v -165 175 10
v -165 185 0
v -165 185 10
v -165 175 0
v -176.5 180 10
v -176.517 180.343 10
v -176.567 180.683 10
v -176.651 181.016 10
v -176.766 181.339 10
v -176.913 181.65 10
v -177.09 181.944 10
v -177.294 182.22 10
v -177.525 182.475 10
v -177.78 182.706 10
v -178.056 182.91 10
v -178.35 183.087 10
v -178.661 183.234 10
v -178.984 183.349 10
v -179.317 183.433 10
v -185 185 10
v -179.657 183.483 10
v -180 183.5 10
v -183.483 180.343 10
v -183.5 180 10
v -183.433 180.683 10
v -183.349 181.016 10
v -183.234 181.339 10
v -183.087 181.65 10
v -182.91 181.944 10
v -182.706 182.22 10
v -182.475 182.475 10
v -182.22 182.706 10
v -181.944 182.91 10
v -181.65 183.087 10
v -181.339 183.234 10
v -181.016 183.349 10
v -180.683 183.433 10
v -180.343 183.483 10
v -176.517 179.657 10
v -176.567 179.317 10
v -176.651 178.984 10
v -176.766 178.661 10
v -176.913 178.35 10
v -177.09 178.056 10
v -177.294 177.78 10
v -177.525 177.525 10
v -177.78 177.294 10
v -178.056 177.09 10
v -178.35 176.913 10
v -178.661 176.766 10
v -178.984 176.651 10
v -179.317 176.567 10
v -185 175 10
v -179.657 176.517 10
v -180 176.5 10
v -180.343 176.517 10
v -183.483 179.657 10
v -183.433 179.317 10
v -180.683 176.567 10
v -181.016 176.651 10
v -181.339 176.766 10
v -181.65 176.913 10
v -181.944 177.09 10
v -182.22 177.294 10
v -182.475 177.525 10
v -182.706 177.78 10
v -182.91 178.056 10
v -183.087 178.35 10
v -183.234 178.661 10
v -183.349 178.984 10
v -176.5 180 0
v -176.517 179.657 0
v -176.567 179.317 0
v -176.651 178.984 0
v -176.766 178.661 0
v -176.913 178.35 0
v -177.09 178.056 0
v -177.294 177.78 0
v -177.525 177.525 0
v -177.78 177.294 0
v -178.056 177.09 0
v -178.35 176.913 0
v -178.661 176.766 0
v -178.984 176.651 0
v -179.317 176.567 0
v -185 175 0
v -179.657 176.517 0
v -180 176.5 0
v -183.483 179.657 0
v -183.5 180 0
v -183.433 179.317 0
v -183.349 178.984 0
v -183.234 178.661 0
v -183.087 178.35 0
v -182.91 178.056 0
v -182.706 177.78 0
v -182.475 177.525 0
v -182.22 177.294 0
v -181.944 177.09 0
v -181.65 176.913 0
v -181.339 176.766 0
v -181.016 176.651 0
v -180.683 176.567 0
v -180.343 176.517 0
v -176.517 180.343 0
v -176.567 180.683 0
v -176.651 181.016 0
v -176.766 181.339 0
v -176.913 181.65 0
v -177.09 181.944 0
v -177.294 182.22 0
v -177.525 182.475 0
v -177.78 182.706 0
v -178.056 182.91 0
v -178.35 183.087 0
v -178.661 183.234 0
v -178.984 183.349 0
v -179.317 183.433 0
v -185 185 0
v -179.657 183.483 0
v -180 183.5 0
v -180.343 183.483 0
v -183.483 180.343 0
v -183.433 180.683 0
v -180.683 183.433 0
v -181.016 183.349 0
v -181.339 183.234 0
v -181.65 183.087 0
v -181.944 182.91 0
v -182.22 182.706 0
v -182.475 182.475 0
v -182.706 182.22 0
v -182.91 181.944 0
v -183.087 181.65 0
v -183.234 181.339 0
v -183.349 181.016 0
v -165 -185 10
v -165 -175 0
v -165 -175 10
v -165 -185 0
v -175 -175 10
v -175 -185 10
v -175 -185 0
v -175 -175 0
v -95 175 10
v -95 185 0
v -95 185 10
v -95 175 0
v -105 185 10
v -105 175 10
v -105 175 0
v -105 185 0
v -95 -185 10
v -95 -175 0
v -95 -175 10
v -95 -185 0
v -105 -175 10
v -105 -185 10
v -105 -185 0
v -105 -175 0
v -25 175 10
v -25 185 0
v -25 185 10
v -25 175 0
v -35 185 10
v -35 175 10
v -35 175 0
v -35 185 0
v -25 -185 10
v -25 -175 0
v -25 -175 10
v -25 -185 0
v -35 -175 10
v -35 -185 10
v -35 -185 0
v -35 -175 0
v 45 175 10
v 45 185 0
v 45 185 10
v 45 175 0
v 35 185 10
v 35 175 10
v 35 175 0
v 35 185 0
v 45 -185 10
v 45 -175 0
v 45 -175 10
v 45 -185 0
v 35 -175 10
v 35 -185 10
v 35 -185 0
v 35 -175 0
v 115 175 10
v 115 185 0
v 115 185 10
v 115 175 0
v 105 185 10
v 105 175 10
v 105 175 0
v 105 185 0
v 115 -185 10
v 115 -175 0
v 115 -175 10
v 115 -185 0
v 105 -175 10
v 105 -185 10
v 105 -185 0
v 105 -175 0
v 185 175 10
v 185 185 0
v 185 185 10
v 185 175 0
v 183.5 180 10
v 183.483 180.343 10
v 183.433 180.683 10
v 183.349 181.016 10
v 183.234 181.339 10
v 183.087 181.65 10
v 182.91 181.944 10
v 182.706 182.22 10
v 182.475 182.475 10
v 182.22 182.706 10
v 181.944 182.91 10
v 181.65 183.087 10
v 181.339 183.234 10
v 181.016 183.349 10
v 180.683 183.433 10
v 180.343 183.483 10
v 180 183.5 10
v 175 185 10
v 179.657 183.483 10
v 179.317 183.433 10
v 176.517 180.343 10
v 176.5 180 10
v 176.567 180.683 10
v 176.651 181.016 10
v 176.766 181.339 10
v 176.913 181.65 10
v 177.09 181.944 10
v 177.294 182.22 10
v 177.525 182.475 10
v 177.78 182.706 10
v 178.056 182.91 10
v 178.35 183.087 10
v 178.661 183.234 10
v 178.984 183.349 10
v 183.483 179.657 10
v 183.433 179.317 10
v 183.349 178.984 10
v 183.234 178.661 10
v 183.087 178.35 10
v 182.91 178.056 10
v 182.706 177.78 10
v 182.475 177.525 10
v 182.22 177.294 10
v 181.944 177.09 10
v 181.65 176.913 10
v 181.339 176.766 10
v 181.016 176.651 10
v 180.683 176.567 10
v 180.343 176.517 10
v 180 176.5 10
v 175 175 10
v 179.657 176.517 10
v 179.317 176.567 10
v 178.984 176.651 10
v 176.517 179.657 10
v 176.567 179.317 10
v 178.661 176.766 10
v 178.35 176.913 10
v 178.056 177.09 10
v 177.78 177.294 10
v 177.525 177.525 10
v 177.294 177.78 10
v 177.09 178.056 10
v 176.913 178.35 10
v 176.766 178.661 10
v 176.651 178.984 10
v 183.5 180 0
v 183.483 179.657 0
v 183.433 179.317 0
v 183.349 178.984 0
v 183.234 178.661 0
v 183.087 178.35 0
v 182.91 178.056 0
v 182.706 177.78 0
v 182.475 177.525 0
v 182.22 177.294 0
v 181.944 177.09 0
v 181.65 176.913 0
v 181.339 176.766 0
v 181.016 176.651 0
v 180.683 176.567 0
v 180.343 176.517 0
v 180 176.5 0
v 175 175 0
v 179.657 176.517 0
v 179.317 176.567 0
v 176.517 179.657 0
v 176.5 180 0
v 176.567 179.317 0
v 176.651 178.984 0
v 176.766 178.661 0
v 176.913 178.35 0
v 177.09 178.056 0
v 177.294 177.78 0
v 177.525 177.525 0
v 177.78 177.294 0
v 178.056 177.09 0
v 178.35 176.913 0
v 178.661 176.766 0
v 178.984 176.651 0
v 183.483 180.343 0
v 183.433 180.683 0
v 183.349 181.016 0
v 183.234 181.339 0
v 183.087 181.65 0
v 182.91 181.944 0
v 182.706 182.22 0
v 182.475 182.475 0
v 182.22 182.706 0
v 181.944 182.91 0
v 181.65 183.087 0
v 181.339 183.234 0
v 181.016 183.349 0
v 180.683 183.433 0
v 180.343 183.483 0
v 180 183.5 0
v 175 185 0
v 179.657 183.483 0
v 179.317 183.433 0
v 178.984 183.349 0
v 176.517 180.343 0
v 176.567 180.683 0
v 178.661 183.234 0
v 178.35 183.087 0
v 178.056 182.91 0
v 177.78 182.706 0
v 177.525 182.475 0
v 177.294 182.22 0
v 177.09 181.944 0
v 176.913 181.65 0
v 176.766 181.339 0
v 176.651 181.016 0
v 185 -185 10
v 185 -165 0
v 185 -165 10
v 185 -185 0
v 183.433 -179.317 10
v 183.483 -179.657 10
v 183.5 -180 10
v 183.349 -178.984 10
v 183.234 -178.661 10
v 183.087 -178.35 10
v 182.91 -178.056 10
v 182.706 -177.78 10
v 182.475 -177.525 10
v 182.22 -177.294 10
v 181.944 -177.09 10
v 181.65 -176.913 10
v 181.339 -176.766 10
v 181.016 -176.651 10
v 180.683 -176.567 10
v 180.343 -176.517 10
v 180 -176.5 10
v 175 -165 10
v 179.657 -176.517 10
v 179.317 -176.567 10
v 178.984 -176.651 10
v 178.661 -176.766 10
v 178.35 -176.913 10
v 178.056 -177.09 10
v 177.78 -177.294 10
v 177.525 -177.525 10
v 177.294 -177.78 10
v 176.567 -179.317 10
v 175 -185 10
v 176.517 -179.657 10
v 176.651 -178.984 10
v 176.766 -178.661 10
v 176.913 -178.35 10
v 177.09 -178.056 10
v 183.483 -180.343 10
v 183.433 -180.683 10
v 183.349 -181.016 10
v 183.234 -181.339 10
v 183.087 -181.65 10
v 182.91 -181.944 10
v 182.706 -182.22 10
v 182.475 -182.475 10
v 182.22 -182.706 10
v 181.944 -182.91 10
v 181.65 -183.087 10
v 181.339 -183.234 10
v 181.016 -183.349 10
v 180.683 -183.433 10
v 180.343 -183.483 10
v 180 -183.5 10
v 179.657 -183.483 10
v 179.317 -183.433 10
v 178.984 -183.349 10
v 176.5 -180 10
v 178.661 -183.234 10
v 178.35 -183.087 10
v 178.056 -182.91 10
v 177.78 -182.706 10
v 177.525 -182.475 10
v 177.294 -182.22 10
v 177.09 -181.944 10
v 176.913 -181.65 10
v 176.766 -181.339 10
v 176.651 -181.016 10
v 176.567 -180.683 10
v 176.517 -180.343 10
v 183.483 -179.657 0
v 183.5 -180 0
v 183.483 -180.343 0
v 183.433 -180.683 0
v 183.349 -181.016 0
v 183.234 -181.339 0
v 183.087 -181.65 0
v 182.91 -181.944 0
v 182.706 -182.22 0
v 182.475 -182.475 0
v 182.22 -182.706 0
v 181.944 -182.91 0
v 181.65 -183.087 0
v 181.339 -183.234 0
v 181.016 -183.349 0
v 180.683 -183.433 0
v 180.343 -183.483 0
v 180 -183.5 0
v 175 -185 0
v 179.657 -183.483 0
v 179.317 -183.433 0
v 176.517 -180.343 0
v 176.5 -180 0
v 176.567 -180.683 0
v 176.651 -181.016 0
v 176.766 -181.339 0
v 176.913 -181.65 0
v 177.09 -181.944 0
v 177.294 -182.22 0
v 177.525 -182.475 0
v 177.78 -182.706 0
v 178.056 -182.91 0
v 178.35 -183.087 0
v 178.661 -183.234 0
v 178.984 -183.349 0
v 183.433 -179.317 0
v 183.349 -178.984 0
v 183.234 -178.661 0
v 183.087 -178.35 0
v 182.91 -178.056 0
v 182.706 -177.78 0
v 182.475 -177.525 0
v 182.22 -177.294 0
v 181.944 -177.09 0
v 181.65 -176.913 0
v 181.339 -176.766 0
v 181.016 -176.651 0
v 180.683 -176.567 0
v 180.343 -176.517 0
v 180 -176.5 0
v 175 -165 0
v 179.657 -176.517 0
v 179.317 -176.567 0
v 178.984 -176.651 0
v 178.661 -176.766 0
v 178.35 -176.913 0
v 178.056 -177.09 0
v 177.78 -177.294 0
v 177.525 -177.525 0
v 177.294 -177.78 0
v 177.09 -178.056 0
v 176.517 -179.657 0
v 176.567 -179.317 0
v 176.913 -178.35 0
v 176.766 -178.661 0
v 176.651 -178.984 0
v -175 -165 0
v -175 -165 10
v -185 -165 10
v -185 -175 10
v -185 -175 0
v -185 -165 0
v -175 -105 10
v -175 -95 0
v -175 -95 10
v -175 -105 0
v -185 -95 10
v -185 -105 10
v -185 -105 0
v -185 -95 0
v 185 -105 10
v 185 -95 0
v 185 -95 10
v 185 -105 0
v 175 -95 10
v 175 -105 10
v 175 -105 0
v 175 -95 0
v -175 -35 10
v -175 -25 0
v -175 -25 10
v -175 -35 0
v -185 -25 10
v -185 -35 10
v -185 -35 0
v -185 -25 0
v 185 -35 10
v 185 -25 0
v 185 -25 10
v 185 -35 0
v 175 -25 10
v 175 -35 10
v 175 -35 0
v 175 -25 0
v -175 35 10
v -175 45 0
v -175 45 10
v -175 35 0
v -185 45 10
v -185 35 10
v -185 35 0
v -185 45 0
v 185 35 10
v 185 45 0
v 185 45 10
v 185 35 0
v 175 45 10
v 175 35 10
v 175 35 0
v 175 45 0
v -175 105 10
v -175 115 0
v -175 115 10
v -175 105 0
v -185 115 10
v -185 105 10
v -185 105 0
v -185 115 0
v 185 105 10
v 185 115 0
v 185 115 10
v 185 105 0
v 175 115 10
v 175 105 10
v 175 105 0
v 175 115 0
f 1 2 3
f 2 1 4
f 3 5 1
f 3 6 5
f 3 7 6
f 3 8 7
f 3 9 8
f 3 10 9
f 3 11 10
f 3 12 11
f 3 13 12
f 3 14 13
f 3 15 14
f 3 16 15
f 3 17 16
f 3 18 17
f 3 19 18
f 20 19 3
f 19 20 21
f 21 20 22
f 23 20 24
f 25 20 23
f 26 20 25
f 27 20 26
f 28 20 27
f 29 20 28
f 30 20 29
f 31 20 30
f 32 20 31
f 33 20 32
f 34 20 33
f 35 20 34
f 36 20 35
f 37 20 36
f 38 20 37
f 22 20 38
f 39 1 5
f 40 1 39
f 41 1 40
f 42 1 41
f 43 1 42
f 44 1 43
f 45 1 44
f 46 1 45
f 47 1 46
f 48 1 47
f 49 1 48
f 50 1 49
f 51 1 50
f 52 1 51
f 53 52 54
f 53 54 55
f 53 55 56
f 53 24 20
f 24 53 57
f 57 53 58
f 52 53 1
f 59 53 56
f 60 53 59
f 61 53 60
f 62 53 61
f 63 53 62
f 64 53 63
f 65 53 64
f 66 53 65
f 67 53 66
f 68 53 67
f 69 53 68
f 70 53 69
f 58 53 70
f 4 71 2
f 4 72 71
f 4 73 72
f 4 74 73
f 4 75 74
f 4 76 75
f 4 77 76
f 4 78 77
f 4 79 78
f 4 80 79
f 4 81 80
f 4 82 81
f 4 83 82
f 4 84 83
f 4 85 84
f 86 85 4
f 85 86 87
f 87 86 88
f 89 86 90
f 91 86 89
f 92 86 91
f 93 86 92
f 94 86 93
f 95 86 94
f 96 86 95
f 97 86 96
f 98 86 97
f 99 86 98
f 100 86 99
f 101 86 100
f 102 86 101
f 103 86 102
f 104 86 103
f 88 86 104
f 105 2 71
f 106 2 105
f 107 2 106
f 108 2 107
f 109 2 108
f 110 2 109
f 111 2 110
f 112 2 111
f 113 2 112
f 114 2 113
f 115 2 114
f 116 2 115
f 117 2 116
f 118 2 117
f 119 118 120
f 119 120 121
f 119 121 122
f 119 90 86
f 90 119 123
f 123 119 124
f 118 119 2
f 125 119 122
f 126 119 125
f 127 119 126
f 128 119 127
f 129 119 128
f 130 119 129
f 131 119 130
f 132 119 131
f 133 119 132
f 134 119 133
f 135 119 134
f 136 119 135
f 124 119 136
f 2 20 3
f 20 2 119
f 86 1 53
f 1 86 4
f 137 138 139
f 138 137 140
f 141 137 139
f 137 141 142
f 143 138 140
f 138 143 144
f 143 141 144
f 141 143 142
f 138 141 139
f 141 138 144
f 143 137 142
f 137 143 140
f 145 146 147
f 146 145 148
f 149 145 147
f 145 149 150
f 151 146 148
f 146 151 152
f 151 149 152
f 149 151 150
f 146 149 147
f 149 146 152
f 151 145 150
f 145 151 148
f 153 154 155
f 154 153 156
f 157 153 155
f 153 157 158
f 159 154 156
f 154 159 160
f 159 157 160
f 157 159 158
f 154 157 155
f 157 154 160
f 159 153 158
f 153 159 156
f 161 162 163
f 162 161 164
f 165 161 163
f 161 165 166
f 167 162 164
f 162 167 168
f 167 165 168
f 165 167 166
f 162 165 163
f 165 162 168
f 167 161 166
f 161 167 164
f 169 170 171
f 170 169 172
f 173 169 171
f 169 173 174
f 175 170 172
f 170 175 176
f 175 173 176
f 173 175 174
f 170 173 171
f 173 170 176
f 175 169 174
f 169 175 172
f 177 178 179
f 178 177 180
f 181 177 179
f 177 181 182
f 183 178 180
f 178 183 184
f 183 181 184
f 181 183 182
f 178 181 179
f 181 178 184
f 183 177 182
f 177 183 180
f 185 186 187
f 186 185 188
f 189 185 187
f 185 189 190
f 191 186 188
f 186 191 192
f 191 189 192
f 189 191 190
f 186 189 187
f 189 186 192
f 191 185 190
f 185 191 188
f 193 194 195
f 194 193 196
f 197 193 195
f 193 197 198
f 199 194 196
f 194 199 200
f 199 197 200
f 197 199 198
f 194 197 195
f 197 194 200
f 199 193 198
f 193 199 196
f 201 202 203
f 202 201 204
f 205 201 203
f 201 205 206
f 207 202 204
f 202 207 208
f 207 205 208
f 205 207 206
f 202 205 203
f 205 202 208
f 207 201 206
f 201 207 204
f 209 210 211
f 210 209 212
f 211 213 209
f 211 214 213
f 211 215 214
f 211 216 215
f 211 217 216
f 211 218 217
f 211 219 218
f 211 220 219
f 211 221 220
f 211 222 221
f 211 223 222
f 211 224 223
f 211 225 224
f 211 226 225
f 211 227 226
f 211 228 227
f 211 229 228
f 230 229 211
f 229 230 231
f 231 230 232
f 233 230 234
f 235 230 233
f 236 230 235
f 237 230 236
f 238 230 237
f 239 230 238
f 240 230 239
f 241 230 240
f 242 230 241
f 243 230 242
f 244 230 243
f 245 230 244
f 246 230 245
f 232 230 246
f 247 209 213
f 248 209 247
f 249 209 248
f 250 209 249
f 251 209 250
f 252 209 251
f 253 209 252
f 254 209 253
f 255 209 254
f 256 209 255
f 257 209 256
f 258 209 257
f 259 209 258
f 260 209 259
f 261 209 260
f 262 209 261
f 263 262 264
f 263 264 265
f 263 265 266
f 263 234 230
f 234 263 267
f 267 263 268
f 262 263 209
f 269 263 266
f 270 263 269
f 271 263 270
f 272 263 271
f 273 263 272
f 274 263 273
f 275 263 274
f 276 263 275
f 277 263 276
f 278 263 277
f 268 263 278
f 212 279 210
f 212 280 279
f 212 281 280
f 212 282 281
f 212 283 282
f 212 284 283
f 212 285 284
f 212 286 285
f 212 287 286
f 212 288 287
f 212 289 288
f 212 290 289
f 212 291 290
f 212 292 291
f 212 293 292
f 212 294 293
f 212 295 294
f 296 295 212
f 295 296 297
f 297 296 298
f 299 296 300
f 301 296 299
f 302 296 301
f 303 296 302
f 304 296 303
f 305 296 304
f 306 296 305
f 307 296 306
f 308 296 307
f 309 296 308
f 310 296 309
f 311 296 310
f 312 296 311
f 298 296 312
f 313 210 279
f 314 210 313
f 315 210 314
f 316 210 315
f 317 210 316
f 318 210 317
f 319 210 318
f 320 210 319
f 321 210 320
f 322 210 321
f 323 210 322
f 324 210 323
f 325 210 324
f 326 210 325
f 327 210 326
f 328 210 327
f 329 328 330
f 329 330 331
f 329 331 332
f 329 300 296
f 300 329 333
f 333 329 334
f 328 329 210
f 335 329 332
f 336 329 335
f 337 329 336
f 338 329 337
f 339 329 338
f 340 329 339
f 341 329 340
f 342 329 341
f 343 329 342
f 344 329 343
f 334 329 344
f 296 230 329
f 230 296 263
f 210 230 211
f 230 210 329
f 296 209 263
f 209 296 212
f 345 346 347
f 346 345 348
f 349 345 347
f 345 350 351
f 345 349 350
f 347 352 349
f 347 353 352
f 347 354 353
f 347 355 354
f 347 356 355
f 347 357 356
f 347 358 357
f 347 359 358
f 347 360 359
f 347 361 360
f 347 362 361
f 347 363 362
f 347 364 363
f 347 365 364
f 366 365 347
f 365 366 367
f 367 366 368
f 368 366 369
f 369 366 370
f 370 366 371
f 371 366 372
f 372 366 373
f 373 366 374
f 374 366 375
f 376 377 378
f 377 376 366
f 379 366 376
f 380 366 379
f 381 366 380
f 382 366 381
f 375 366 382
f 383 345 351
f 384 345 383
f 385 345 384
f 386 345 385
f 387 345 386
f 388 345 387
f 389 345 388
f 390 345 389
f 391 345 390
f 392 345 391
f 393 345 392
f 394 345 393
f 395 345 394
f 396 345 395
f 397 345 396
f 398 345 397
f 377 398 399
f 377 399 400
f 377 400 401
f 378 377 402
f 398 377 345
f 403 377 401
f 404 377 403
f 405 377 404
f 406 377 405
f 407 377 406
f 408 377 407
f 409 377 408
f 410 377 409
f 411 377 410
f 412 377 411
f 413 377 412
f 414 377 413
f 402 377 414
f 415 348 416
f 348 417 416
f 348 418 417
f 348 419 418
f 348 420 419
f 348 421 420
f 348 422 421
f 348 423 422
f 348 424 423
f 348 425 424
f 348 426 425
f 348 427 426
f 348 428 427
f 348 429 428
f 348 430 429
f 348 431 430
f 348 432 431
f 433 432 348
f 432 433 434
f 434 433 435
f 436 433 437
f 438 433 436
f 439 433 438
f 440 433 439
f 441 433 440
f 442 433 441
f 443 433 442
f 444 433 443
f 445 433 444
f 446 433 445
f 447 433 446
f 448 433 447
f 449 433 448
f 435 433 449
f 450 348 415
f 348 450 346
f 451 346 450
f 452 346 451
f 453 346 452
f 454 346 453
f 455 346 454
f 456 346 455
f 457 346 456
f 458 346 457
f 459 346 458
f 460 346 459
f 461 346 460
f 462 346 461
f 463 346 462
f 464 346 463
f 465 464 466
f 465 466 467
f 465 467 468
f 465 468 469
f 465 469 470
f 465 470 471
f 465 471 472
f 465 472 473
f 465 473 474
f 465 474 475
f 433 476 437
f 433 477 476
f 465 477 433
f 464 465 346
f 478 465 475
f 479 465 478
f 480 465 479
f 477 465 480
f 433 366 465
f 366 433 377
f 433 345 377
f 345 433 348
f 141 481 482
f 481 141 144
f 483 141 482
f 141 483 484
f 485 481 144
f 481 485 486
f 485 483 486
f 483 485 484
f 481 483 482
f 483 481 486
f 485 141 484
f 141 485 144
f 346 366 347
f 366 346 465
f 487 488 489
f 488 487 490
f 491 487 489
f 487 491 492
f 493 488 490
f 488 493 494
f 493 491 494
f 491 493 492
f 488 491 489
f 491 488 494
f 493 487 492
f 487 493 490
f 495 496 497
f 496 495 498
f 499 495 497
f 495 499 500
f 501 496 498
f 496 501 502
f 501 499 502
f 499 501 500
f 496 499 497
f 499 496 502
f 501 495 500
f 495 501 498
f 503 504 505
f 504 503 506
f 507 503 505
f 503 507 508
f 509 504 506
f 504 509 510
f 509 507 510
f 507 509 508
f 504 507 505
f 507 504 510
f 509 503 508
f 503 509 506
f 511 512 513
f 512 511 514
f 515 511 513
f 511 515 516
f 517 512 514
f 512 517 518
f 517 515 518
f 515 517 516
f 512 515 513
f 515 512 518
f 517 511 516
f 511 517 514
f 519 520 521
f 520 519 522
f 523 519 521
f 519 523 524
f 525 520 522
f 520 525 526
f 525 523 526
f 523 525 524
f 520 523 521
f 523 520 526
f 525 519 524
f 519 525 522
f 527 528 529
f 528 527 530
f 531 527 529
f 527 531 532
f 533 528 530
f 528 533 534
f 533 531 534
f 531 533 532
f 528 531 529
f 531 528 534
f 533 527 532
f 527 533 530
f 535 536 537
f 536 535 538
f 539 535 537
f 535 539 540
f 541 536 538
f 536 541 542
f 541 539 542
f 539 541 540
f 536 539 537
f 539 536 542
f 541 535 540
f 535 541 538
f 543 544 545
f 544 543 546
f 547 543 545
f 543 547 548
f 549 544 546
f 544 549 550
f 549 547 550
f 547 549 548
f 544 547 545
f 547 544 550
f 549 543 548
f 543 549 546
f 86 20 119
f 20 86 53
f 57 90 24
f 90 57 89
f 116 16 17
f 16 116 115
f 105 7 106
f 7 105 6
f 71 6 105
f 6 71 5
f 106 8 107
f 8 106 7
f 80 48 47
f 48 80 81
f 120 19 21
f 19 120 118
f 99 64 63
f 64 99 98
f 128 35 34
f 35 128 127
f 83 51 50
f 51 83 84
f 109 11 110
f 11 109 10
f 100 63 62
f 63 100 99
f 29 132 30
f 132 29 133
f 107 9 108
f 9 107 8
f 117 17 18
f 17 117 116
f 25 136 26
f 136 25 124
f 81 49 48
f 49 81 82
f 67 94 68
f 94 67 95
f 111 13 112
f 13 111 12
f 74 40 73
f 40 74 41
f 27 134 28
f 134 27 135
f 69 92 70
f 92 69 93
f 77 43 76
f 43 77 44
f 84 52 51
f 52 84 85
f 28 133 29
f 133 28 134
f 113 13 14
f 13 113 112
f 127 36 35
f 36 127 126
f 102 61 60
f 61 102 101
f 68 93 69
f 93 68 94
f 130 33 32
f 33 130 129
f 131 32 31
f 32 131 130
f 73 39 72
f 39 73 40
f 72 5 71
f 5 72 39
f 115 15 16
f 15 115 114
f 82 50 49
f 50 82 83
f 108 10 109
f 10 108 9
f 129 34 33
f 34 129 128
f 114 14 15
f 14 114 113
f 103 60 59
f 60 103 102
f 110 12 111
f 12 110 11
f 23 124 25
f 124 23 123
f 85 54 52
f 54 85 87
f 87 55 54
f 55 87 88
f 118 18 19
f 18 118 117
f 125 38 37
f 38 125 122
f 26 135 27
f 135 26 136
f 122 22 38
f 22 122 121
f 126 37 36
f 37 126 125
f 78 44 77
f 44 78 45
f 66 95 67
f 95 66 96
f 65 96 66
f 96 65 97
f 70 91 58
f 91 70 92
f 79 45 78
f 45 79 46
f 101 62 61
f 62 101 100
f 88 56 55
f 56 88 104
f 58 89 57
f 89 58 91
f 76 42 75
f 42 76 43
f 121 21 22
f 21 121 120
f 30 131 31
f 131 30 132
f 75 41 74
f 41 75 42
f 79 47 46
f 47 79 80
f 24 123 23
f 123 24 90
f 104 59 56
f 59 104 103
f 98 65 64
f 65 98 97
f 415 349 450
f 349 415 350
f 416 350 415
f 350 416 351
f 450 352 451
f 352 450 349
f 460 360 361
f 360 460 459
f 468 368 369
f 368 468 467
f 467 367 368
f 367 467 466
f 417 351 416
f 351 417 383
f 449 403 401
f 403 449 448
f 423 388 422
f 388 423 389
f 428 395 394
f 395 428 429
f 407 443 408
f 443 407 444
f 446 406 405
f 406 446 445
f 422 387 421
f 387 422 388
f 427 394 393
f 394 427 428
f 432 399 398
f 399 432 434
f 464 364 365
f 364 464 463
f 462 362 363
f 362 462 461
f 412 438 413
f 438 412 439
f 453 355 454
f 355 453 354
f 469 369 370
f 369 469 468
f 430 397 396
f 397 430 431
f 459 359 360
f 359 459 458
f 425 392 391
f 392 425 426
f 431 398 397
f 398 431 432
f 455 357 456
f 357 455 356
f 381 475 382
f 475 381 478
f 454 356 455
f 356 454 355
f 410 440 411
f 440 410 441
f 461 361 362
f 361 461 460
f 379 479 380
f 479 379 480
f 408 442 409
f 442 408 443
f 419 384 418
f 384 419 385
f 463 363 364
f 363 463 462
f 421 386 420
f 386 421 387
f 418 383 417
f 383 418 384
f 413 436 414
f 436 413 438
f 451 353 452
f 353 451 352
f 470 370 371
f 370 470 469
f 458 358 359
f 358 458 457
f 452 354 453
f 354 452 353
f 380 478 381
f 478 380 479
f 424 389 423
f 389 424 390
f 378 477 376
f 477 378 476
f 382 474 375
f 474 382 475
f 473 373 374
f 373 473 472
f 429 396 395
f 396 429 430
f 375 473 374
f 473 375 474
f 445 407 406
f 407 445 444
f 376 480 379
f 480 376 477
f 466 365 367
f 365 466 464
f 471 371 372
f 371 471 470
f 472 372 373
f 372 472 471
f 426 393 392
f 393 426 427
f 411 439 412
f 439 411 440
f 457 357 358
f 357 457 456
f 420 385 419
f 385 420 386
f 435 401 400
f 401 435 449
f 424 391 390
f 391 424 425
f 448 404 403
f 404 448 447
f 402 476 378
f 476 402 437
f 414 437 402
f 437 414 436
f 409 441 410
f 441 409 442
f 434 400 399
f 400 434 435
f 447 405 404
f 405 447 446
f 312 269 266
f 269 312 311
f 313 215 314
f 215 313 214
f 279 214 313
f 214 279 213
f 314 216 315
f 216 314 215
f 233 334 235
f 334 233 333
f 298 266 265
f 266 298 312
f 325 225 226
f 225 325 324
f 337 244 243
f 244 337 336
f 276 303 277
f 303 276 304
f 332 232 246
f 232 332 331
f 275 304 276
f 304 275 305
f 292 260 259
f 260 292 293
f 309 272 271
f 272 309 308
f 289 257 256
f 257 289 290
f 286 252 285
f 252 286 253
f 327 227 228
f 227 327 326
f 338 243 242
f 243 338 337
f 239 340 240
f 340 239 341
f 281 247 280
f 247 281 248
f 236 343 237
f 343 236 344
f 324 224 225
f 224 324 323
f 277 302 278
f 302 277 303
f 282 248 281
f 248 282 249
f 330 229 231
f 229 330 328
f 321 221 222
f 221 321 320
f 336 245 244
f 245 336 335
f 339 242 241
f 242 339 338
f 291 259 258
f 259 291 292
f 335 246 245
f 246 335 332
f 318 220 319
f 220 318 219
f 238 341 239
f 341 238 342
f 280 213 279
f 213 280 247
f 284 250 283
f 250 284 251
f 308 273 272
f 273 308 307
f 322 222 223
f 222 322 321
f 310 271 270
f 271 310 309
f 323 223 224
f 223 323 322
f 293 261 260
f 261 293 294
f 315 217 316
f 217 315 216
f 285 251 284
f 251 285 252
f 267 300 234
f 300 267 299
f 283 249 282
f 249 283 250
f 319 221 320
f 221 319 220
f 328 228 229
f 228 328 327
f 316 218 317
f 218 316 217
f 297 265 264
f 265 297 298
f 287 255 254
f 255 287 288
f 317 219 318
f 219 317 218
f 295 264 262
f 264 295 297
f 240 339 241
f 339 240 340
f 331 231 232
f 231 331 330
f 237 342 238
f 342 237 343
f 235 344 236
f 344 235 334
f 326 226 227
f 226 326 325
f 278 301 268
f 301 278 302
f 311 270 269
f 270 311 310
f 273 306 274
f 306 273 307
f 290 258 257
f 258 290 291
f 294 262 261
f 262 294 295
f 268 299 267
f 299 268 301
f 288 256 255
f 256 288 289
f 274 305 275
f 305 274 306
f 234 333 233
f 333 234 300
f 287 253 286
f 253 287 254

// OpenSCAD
// ring_41.scad - ring index 41 (z bottom = 410 mm)
$fn = 64; bar = 10; half_b = bar/2; outer = 370; half_outer = outer/2;
front_y = 180; back_y = -180; left_x = -180; right_x = 180;
x_centers = [-170, -100, -30, 40, 110, 180];
z_centers = [5, 85, 155, 225, 295, 365, 435, 505, 575, 645, 715]; ring_z = 410;
module place_box(cx, cy, sx, sy) { translate([cx - sx/2, cy - sy/2, 0]) cube([sx, sy, bar]); }

difference() { union() {
    for (x = x_centers) { place_box(x, front_y, bar, bar); place_box(x, back_y, bar, bar); }
    for (y = x_centers) { place_box(left_x, y, bar, bar); place_box(right_x, y, bar, bar); }
    for (zc = z_centers) if ((zc - half_b < ring_z + bar) && (zc + half_b > ring_z)) {
        translate([-half_outer, front_y - half_b, 0]) cube([outer, bar, bar]);
        translate([-half_outer, back_y - half_b, 0])  cube([outer, bar, bar]);
        translate([left_x - half_b, -half_outer, 0])  cube([bar, outer, bar]);
        translate([right_x - half_b, -half_outer, 0]) cube([bar, outer, bar]);
    }
  }
  for (cx = [-180, 180]) for (cy = [-180, 180]) translate([cx, cy, 0]) cylinder(h = bar, r = 3.5, $fn = 64);
}
